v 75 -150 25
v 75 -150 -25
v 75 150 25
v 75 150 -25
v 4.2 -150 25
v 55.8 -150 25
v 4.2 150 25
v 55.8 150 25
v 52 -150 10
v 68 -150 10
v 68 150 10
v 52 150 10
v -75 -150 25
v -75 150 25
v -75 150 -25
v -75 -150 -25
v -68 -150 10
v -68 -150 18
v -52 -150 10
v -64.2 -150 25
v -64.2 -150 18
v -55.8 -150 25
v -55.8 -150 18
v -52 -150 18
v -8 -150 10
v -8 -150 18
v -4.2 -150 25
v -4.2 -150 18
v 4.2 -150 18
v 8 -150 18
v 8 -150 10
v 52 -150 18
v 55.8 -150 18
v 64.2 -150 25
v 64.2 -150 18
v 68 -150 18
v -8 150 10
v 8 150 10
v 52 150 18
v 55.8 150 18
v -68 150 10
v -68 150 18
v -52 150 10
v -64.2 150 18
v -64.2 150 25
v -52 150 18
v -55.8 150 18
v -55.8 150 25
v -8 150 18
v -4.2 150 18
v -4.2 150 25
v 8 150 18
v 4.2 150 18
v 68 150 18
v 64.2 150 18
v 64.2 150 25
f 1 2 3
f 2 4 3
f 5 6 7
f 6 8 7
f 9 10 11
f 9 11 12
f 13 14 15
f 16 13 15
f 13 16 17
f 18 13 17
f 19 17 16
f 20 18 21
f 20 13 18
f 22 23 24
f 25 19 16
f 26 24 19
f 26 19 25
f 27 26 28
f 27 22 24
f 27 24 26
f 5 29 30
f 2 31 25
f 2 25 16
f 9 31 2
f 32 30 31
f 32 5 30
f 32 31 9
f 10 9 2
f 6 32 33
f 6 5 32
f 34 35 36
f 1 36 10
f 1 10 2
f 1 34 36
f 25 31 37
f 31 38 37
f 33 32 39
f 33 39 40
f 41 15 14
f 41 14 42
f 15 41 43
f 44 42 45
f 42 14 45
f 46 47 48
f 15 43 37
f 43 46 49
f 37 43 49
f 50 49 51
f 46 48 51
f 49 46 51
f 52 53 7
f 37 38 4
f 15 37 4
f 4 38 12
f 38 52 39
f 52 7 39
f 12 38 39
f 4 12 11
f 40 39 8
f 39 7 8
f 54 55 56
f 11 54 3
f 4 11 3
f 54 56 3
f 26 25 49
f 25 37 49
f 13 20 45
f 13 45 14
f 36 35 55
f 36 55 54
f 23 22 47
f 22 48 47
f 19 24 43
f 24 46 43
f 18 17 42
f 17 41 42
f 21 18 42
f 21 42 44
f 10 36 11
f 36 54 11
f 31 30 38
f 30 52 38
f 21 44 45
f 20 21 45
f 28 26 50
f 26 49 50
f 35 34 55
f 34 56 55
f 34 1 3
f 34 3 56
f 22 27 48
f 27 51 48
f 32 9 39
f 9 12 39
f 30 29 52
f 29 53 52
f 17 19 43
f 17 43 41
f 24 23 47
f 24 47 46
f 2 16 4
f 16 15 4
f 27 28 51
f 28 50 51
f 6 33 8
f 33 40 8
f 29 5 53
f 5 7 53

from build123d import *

# Parameters (mm, degrees)
F1_DEPTH      = 150
F1_DEPTH_BACK = 150


with BuildPart() as f1:
    # F0 (on Front) → F1 (new body, two sides)
    with BuildSketch(Plane.XZ) as f1_sk:
        Polygon((-75, 25), (-75, -25), (75, -25), (75, 25), (64.2, 25), (64.2, 18), (68, 18), (68, 10), (52, 10), (52, 18), (55.8, 18), (55.8, 25), (4.2, 25), (4.2, 18), (8, 18), (8, 10), (-8, 10), (-8, 18), (-4.2, 18), (-4.2, 25), (-55.8, 25), (-55.8, 18), (-52, 18), (-52, 10), (-68, 10), (-68, 18), (-64.2, 18), (-64.2, 25), align=None)
    extrude(amount=-F1_DEPTH)
    extrude(f1_sk.sketch, amount=F1_DEPTH_BACK)


solid = f1.part
